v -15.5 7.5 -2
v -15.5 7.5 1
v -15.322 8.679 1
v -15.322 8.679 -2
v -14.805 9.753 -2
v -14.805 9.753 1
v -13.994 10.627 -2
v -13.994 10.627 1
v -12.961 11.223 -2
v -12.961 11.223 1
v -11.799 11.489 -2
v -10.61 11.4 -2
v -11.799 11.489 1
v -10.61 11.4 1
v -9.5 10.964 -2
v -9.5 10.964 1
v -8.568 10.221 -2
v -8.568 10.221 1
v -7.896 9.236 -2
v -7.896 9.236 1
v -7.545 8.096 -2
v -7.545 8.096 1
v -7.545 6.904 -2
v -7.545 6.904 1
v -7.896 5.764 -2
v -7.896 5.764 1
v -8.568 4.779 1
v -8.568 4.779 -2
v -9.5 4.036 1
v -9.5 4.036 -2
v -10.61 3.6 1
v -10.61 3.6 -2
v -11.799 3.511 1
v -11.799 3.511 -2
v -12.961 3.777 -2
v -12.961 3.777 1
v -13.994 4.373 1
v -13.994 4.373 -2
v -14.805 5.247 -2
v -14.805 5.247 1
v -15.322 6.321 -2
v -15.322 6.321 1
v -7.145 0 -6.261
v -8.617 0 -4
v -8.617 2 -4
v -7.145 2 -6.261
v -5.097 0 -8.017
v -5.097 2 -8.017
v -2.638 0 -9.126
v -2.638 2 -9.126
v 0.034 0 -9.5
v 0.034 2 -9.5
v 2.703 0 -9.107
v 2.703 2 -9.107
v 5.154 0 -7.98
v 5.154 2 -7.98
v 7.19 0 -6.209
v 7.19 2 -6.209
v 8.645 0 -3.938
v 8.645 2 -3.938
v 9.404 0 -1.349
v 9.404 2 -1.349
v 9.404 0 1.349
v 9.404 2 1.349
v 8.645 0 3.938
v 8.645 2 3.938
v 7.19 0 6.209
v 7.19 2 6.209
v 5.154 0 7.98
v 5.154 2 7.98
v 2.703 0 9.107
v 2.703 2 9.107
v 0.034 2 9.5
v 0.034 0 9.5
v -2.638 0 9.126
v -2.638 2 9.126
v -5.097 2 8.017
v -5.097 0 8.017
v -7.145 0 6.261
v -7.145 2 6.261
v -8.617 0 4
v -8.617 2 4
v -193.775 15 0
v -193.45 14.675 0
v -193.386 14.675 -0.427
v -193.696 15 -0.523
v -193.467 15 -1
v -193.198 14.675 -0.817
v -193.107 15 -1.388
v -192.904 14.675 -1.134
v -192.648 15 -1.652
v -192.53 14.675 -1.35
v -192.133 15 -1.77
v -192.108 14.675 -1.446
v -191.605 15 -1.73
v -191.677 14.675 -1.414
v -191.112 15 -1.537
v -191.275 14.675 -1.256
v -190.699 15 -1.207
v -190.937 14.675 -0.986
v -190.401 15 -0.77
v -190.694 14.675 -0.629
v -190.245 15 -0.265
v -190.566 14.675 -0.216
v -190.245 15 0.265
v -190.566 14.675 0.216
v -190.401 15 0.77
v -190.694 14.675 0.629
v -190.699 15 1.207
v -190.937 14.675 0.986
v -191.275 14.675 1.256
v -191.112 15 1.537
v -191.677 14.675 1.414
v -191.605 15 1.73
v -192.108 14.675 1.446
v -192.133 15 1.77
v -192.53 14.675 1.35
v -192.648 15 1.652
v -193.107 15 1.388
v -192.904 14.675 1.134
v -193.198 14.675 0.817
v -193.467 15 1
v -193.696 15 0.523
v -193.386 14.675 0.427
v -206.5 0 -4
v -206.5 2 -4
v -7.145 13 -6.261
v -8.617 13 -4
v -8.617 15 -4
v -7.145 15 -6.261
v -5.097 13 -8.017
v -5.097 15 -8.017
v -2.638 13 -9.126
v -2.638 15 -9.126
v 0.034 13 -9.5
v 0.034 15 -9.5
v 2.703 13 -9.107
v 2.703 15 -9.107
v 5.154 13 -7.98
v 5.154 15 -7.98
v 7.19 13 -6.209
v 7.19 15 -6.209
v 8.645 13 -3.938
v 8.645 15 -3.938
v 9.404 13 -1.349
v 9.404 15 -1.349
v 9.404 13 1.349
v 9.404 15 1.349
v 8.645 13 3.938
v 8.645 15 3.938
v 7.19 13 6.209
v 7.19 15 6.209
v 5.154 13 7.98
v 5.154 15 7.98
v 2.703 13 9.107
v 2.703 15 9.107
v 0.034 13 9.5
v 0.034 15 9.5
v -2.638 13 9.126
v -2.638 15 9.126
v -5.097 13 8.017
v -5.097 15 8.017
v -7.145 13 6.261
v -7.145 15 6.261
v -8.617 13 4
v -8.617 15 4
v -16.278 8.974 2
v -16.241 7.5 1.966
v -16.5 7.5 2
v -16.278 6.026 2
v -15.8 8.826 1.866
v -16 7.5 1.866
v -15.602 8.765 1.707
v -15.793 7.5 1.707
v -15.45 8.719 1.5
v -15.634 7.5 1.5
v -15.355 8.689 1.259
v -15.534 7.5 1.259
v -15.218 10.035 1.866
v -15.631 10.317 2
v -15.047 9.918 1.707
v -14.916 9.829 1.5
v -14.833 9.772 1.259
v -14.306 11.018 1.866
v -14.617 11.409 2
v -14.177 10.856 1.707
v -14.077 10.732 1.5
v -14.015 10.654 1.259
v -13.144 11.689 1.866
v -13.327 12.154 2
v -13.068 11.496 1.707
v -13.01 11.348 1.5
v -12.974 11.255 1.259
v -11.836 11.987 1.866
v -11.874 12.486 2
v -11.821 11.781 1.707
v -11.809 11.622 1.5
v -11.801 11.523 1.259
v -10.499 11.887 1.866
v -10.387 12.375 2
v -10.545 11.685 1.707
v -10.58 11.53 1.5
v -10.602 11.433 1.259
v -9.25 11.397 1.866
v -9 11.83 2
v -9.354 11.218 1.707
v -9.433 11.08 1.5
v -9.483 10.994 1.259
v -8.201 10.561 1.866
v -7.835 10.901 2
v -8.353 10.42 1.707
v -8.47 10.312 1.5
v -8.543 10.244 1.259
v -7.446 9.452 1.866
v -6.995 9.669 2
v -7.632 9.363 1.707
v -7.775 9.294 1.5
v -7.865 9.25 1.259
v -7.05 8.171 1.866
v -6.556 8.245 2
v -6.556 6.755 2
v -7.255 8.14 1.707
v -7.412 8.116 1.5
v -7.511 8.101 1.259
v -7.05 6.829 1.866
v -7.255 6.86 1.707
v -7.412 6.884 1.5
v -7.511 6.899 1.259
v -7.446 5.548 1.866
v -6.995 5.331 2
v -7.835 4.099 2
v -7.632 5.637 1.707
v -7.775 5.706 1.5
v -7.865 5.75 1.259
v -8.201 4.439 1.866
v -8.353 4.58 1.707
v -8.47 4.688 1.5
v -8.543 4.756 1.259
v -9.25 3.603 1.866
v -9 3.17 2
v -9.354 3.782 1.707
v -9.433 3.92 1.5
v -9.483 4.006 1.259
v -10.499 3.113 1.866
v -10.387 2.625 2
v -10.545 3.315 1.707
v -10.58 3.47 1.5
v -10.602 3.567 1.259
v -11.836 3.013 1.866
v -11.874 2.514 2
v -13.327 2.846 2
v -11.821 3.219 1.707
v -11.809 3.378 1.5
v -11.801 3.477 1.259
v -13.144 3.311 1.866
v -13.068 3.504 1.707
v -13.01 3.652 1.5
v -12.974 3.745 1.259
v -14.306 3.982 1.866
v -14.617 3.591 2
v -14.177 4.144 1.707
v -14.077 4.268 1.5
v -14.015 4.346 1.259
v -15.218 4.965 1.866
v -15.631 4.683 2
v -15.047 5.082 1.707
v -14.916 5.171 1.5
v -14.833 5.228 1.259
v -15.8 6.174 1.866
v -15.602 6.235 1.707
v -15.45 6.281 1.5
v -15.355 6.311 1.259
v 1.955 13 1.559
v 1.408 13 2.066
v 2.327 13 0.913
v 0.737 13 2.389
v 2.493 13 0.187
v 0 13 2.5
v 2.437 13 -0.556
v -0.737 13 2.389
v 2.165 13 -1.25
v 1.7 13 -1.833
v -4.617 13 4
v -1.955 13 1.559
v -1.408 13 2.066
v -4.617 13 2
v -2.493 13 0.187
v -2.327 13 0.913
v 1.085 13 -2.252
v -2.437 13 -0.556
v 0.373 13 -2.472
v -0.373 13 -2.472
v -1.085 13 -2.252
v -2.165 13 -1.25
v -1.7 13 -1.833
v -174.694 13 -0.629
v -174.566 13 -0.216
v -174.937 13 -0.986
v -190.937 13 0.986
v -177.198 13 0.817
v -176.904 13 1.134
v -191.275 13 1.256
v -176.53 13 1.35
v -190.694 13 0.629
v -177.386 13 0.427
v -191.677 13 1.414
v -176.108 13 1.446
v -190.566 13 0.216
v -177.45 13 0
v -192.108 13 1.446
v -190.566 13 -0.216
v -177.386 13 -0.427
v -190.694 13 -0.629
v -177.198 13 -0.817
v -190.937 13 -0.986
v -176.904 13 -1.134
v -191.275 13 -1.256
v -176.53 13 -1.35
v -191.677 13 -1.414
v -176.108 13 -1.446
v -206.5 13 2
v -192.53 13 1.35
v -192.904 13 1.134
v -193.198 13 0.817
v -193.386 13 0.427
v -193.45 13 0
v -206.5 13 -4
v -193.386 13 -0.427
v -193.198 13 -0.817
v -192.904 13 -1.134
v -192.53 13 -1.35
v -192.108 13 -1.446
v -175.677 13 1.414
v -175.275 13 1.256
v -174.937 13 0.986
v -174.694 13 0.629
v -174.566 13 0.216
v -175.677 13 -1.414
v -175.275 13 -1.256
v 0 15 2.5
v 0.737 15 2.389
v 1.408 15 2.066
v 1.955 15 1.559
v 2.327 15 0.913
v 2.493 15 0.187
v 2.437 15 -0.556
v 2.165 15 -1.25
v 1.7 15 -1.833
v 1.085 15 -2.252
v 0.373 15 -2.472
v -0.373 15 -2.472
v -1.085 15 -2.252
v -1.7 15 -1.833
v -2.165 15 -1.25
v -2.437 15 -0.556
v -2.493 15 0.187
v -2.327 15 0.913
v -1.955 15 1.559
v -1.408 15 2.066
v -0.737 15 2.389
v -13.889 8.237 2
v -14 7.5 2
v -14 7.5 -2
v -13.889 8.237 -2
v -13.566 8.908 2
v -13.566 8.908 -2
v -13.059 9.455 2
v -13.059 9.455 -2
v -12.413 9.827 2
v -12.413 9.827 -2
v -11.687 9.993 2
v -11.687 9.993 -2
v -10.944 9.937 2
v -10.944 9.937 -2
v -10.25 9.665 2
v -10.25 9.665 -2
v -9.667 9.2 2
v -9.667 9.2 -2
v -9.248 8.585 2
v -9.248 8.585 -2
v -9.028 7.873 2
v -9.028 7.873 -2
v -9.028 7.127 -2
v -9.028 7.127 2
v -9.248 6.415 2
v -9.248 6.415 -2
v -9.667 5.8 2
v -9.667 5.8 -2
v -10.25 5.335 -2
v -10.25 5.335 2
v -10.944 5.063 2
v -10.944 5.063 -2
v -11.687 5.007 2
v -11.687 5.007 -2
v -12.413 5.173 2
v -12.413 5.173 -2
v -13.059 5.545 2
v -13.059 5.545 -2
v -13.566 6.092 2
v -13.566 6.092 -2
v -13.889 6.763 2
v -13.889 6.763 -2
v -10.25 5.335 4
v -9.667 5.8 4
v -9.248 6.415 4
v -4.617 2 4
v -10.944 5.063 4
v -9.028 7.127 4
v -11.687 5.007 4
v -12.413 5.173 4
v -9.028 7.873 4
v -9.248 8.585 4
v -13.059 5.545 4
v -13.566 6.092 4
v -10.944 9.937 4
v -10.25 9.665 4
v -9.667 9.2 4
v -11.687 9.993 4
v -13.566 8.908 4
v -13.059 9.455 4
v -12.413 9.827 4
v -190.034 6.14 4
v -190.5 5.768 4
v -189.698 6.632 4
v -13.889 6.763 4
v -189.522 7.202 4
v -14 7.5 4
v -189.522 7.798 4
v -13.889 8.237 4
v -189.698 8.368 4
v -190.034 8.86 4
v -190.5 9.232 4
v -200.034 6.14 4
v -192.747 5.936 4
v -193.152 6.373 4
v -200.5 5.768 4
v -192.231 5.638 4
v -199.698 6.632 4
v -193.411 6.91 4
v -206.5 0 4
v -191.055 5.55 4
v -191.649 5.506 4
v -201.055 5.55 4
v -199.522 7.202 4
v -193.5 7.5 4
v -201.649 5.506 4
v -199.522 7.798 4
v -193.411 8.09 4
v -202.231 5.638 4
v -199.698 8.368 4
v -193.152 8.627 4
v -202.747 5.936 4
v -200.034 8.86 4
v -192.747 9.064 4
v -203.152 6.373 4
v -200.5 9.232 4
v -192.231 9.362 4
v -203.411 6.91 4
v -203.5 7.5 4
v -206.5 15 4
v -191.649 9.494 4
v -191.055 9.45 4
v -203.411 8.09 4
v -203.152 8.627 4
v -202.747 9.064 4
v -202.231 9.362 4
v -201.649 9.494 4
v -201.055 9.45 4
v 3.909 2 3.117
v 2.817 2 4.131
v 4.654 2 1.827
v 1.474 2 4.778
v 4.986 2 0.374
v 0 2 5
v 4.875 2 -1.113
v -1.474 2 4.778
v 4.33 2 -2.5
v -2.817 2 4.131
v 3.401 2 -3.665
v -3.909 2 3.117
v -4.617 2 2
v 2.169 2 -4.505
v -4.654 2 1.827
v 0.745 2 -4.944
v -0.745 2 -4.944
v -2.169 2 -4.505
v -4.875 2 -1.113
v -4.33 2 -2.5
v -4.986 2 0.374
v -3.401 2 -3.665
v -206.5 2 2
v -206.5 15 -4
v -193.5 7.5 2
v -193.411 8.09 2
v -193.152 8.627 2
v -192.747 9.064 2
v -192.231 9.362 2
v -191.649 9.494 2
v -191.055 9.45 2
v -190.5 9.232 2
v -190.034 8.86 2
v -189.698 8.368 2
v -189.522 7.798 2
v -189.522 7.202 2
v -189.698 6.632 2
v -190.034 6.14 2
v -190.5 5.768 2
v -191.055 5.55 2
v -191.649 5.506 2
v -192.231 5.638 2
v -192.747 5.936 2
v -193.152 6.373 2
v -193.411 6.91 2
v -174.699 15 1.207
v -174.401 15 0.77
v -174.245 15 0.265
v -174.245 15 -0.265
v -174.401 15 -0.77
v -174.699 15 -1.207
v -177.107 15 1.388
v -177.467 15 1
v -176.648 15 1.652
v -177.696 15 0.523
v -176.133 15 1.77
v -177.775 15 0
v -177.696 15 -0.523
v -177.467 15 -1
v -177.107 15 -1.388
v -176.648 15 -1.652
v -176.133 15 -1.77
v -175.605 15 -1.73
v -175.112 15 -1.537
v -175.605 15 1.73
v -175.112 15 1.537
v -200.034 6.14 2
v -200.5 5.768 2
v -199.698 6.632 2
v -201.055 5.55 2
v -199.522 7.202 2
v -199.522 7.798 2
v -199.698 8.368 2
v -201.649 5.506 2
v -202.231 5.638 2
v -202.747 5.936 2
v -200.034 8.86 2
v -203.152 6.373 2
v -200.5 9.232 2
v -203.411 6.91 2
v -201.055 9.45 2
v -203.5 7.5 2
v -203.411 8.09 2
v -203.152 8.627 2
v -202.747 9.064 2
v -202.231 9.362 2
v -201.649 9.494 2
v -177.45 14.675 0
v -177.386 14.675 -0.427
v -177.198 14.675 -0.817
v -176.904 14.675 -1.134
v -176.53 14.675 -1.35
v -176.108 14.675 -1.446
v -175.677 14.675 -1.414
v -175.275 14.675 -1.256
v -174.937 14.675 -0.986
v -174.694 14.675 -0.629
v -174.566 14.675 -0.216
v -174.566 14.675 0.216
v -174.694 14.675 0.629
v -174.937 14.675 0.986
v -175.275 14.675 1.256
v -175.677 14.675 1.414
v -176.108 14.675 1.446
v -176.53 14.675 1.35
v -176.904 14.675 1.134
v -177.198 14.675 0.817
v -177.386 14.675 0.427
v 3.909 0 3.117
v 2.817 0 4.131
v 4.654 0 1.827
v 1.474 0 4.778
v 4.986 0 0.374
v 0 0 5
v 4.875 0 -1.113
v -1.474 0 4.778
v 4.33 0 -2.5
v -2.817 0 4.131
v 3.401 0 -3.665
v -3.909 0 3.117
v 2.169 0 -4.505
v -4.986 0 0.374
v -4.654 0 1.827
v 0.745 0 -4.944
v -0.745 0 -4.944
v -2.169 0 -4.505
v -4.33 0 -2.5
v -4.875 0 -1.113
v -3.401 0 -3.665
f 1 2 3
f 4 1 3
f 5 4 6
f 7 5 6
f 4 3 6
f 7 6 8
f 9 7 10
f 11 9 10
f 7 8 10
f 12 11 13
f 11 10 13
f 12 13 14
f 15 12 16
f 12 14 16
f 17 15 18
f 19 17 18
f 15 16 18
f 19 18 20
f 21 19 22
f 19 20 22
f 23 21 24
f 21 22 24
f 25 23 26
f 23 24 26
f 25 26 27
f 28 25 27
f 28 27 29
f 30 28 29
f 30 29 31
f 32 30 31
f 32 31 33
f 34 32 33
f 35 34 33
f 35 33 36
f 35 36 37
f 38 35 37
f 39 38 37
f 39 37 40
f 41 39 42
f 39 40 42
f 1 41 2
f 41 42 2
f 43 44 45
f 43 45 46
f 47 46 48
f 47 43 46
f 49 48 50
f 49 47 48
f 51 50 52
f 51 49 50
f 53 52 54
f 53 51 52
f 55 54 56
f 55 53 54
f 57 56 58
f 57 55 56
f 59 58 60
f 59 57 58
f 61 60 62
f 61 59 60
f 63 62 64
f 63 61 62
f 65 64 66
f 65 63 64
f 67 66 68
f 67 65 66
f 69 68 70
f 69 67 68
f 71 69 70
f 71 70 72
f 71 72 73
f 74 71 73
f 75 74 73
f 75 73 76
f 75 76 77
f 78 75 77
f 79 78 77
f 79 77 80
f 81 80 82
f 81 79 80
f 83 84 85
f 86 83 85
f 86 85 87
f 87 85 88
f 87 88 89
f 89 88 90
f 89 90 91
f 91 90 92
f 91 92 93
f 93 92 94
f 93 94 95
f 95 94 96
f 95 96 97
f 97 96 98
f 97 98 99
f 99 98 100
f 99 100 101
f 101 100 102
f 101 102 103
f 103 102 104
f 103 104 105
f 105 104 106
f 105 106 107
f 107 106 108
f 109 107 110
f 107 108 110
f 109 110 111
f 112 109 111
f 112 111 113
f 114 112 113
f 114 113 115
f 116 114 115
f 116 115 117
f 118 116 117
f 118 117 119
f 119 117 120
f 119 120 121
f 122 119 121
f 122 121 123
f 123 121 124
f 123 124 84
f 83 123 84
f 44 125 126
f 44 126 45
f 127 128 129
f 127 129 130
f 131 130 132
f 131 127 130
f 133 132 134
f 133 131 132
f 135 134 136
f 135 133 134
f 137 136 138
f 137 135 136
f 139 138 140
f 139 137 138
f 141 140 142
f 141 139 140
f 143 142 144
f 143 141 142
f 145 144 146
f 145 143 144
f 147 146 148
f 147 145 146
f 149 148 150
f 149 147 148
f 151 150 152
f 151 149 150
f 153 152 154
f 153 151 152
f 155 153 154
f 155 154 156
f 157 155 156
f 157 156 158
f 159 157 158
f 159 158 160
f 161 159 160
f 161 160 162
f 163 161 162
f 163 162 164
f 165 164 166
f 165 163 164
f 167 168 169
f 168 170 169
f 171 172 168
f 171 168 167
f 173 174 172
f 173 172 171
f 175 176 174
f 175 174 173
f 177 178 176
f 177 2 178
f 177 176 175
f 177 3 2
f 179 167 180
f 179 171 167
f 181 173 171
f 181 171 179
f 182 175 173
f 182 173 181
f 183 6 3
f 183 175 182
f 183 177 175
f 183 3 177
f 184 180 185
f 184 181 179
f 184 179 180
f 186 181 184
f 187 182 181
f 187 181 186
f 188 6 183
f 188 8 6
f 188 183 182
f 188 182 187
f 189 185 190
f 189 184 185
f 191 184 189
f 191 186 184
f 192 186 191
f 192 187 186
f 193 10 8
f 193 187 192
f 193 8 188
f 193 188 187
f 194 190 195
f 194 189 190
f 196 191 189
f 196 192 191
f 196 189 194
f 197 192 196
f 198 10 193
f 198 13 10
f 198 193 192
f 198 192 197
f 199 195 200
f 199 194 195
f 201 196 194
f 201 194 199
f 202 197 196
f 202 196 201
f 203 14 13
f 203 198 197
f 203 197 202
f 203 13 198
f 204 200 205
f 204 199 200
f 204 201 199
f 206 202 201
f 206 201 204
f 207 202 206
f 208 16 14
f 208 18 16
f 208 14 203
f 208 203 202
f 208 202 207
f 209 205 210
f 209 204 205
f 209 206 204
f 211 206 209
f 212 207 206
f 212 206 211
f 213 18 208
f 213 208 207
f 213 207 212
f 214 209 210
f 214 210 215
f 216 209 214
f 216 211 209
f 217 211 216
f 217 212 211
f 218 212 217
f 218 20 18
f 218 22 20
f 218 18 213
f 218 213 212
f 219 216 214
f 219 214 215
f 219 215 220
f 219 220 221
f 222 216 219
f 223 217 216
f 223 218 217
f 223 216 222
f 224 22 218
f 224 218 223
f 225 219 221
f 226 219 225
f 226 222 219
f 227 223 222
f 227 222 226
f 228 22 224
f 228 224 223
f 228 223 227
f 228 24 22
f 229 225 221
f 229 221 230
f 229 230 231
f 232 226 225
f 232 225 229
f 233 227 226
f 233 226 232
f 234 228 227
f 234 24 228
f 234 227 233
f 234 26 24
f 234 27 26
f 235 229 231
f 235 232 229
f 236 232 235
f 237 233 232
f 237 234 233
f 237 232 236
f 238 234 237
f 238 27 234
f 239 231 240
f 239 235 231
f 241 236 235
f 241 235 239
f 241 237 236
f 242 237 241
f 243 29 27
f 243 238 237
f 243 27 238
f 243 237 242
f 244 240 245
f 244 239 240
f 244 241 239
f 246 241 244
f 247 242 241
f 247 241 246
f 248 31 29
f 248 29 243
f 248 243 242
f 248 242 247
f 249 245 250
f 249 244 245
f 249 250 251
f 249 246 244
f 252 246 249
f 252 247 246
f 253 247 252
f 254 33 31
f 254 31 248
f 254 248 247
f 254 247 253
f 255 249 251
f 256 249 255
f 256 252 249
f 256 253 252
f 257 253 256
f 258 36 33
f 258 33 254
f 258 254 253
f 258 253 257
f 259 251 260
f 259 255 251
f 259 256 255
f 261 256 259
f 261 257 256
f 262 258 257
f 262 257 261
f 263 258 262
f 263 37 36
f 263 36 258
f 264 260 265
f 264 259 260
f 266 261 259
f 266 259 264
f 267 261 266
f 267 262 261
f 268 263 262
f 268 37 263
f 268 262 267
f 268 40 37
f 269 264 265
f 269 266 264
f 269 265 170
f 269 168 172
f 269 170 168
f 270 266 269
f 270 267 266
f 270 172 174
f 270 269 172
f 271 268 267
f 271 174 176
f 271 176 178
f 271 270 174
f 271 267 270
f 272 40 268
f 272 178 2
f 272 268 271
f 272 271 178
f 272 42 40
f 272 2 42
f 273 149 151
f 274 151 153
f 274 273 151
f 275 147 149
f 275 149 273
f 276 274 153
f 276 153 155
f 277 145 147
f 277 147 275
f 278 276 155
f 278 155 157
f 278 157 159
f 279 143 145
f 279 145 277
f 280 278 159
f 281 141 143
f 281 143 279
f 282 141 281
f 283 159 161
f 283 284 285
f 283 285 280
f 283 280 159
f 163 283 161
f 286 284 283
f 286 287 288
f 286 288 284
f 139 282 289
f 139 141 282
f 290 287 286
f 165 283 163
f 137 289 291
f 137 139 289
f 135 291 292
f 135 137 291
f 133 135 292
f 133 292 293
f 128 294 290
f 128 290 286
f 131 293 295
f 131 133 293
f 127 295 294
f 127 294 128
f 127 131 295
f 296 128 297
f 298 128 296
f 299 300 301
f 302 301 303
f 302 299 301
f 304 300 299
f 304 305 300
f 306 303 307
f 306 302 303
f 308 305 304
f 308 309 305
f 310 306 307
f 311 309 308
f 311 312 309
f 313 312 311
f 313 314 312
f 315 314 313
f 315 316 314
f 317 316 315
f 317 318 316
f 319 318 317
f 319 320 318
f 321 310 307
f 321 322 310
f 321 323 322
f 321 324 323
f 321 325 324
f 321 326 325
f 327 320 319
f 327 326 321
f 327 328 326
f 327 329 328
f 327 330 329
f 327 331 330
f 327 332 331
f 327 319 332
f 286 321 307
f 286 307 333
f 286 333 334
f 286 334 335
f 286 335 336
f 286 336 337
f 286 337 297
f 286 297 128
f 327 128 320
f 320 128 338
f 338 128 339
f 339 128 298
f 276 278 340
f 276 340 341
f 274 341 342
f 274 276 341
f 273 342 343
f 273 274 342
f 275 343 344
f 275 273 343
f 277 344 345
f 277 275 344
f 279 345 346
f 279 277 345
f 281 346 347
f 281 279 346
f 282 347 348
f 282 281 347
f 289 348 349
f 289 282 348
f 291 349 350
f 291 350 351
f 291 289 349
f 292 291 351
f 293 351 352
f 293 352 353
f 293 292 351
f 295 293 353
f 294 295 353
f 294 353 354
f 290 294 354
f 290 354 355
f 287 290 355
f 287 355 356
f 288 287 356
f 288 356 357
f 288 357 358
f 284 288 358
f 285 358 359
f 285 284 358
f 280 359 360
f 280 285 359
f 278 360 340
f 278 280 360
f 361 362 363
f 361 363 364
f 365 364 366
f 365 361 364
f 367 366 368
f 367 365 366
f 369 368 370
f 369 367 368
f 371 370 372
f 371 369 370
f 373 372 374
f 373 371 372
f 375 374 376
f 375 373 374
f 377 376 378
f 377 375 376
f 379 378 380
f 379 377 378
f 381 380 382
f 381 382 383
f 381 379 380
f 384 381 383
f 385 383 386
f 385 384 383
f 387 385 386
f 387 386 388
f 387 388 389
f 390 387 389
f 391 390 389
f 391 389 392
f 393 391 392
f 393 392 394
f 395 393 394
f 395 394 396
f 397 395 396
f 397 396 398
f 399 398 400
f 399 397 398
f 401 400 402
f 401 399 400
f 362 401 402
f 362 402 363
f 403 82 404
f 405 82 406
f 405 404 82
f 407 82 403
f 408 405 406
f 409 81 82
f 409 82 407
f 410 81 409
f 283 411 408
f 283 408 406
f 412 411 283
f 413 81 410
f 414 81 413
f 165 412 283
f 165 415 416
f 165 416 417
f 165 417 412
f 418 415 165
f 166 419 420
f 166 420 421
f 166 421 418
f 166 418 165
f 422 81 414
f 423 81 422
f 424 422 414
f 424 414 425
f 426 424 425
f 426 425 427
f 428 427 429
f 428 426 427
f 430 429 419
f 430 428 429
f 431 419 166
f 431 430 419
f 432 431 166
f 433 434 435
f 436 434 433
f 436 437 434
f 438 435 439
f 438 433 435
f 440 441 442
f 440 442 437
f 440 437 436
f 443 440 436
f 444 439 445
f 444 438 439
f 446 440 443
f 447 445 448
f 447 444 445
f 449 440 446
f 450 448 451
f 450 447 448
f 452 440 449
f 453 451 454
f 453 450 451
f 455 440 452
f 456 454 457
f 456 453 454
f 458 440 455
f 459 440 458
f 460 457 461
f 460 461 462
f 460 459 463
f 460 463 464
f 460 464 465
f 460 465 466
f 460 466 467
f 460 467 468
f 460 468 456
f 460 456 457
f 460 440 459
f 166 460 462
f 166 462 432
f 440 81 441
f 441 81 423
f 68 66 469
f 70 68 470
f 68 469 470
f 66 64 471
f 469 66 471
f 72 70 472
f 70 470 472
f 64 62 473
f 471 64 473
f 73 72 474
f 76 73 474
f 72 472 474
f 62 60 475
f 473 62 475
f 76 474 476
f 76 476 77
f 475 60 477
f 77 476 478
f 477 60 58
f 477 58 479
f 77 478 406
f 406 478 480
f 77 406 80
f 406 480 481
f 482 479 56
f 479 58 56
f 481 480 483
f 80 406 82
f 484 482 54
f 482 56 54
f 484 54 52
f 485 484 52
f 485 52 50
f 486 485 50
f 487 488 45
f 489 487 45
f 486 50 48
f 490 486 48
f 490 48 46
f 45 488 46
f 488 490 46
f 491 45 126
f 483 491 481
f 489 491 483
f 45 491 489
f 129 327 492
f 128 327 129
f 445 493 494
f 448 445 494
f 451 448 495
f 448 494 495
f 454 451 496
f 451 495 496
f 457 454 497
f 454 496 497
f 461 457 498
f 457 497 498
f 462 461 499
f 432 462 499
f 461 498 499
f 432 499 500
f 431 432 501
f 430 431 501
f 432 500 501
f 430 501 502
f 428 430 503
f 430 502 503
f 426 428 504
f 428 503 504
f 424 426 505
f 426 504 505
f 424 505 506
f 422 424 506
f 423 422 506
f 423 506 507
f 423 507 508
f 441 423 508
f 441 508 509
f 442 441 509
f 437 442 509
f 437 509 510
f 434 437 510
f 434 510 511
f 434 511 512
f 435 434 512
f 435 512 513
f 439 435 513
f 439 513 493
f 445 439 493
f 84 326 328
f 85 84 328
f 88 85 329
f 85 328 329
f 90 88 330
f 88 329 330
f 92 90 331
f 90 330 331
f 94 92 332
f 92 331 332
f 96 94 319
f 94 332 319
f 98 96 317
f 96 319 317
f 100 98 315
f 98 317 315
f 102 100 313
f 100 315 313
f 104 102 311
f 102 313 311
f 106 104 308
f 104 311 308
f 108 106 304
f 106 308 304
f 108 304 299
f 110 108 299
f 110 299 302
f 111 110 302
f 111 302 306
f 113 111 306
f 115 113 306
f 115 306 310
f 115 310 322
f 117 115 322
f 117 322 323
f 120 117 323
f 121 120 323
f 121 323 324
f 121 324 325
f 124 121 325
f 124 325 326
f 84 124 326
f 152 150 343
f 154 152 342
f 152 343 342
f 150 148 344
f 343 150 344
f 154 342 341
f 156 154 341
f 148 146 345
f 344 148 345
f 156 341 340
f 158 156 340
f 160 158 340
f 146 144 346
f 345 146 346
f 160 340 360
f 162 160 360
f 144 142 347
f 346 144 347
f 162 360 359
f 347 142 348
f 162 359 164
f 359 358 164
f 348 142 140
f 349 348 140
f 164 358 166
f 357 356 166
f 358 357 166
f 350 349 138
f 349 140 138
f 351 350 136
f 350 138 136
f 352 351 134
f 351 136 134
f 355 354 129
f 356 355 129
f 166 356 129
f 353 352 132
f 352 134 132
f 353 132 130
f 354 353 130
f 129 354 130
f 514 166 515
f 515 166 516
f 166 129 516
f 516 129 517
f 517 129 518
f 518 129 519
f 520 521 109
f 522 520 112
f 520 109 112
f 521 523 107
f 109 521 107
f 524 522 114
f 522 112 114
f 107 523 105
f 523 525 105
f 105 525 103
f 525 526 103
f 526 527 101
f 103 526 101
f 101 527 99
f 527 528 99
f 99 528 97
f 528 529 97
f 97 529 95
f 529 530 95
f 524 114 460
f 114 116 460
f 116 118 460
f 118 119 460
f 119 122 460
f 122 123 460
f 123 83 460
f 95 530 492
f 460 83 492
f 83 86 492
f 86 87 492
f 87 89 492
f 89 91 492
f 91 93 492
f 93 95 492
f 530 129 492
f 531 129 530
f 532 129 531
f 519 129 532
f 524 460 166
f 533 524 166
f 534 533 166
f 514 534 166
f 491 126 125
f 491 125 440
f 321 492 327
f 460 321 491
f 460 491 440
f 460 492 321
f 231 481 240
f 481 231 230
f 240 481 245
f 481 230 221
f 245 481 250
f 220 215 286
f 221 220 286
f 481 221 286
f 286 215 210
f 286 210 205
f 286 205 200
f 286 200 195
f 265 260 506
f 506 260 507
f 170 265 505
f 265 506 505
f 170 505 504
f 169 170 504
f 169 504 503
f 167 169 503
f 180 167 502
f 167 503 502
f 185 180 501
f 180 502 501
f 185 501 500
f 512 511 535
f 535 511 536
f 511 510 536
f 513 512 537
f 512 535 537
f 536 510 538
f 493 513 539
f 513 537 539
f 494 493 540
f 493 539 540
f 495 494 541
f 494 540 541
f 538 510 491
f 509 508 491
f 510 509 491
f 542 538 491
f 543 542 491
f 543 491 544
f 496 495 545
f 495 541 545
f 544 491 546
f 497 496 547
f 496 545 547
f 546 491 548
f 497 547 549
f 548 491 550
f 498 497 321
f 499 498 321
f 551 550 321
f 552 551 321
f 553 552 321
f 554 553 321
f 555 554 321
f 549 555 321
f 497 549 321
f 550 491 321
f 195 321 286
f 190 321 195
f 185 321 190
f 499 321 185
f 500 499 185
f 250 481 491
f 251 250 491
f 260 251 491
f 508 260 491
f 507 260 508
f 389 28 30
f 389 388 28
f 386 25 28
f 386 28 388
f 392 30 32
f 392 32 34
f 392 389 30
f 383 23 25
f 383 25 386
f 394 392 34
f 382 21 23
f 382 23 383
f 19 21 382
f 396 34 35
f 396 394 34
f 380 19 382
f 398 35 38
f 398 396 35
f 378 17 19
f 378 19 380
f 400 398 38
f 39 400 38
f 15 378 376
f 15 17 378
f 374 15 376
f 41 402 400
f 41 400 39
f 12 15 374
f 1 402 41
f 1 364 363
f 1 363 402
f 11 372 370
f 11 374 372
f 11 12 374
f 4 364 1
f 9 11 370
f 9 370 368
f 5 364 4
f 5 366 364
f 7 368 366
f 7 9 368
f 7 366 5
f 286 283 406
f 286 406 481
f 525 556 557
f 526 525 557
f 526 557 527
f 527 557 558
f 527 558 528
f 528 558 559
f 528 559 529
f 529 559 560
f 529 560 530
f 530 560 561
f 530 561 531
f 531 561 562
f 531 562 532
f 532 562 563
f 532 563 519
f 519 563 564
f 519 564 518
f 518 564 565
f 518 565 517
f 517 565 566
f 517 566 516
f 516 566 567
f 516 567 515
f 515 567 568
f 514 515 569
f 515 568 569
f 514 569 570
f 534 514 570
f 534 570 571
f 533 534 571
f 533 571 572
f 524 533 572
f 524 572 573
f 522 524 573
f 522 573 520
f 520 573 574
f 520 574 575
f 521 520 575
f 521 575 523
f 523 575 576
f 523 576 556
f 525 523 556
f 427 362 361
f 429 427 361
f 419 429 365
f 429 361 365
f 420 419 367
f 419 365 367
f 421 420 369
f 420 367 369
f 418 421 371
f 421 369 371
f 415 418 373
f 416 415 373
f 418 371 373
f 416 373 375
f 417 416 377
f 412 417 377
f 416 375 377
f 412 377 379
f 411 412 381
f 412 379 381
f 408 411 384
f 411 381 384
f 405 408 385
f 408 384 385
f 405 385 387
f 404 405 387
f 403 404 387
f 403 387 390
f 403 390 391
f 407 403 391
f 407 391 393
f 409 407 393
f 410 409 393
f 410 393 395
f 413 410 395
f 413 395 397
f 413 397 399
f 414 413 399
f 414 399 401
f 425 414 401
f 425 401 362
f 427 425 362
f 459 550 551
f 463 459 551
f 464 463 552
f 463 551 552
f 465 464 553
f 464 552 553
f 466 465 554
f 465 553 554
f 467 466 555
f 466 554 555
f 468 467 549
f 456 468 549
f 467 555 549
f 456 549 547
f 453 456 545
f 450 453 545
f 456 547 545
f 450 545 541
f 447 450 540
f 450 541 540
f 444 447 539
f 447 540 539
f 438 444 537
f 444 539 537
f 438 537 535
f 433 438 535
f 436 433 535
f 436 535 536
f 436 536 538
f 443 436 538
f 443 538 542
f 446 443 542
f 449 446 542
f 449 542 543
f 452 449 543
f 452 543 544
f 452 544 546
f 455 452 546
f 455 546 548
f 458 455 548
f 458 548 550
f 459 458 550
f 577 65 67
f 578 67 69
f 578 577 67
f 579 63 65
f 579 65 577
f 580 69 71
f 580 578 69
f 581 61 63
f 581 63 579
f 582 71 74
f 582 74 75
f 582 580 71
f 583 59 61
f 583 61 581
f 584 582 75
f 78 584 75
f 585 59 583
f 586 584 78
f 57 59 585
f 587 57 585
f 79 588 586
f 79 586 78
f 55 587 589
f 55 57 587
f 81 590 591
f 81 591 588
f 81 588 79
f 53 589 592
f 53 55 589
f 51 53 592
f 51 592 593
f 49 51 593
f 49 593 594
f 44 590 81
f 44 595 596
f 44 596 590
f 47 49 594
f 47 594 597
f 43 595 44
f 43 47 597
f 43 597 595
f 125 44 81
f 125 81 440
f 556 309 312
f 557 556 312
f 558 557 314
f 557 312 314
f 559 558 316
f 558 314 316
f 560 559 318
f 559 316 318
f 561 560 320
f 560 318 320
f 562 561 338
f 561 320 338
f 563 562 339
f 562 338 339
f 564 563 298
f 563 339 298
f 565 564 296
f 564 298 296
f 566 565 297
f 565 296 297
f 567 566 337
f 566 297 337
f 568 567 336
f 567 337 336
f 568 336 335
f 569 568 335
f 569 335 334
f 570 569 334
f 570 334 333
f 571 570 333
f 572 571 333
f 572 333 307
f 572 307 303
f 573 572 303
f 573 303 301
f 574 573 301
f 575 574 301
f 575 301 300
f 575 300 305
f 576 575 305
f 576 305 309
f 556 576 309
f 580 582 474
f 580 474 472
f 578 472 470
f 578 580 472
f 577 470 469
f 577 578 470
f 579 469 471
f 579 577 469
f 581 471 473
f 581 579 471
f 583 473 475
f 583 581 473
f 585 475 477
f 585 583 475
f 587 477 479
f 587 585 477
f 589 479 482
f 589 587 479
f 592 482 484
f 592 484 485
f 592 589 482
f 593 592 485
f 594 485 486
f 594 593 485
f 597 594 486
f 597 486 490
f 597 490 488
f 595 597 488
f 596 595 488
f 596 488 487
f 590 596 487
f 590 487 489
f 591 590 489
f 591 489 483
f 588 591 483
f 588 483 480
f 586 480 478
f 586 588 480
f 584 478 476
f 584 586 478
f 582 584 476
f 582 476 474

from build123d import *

# Parameters (mm, degrees)
SKETCH1_R                         = 5
BOSS_EXTRUDE3_DEPTH               = 2
SKETCH5_W                         = 2
SKETCH5_H                         = 11
BOSS_EXTRUDE4_DEPTH               = 197.88316
SKETCH6_R                         = 2.5
BOSS_EXTRUDE5_DEPTH               = 2
SKETCH8_W                         = 2
SKETCH8_H                         = 11
BOSS_EXTRUDE6_DEPTH               = 4
CUT_EXTRUDE8_REACH                = 209.363
SKETCH10_R                        = 2
SKETCH11_R                        = 4
SKETCH11_R_2                      = 2.5
BOSS_EXTRUDE7_DEPTH               = 4
CUT_EXTRUDE9_REACH                = 209.363
SKETCH12_R                        = 2.5
FILLET1_R                         = 1
M3_5X0_6_TAPPED_HOLE7_D           = 2.9
M3_5X0_6_TAPPED_HOLE7_DEPTH       = 2
M3_5X0_6_TAPPED_HOLE7_CSINK_D     = 3.55
M3_5X0_6_TAPPED_HOLE7_CSINK_ANGLE = 90


with BuildPart() as part:
    # Sketch1 → Boss-Extrude3 (new body)
    with BuildSketch(Plane(origin=(0, 0, 0), x_dir=(1, 0, 0), z_dir=(0, 1, 0))):
        with BuildLine():
            Line((-206.5, 4), (-8.61684397, 4))
            ThreePointArc((-8.61684397, 4), (9.5, 0), (-8.61684397, -4))
            Line((-8.61684397, -4), (-206.5, -4))
            Line((-206.5, -4), (-206.5, 4))
        make_face()
        with Locations(Location((0, 0, 0), (0, 0, 270))):
            Circle(SKETCH1_R, mode=Mode.SUBTRACT)
    extrude(amount=BOSS_EXTRUDE3_DEPTH)

    # Sketch5 → Boss-Extrude4 (add)
    with BuildSketch(Plane.ZY.offset(206.5)):
        with Locations((3, 7.5)):
            Rectangle(SKETCH5_W, SKETCH5_H)
    extrude(amount=-BOSS_EXTRUDE4_DEPTH)


with BuildPart() as boss_extrude5_tool:
    # Sketch6 → Boss-Extrude5 (new body)
    with BuildSketch(Plane(origin=(0, 13, 0), x_dir=(1, 0, 0), z_dir=(0, 1, 0))):
        with BuildLine():
            Line((-206.5, 4), (-8.61684397, 4))
            ThreePointArc((-8.61684397, 4), (9.5, 0), (-8.61684397, -4))
            Line((-8.61684397, -4), (-206.5, -4))
            Line((-206.5, -4), (-206.5, 4))
        make_face()
        with Locations(Location((0, 0, 0), (0, 0, 270))):
            Circle(SKETCH6_R, mode=Mode.SUBTRACT)
    extrude(amount=BOSS_EXTRUDE5_DEPTH)


with BuildPart() as part_1:
    add(part.part)


with BuildPart() as part_2:
    # Boss-Extrude5: joined with boss_extrude5_tool
    add(part_1.part.fuse(boss_extrude5_tool.part, tol=0.00001))

    # Sketch8 → Boss-Extrude6 (add)
    with BuildSketch(Plane(origin=(-8.61684397, 0, 0), x_dir=(0, 0, -1), z_dir=(1, 0, 0))):
        with Locations((-3, 7.5)):
            Rectangle(SKETCH8_W, SKETCH8_H)
    extrude(amount=BOSS_EXTRUDE6_DEPTH)

    # Sketch10 → Cut-Extrude8 (cut, up to next)
    with BuildSketch(Plane(origin=(0, 0, 2), x_dir=(-1, 0, 0), z_dir=(0, 0, -1)), mode=Mode.PRIVATE) as cut_extrude8_sk1:
        with Locations((201.5, 7.5)):
            Circle(SKETCH10_R)
    cut_extrude8_tool1 = extrude(cut_extrude8_sk1.sketch, amount=-CUT_EXTRUDE8_REACH, mode=Mode.PRIVATE) & part_2.part
    # Sketch10 → Cut-Extrude8 (cut, up to next)
    with BuildSketch(Plane(origin=(0, 0, 2), x_dir=(-1, 0, 0), z_dir=(0, 0, -1)), mode=Mode.PRIVATE) as cut_extrude8_sk2:
        with Locations((191.5, 7.5)):
            Circle(SKETCH10_R)
    cut_extrude8_tool2 = extrude(cut_extrude8_sk2.sketch, amount=-CUT_EXTRUDE8_REACH, mode=Mode.PRIVATE) & part_2.part
    add(cut_extrude8_tool1.solids().sort_by_distance((-201.5, 7.5, 2))[0], mode=Mode.SUBTRACT)
    add(cut_extrude8_tool2.solids().sort_by_distance((-191.5, 7.5, 2))[0], mode=Mode.SUBTRACT)

    # Sketch11 → Boss-Extrude7 (add)
    with BuildSketch(Plane(origin=(0, 0, 2), x_dir=(-1, 0, 0), z_dir=(0, 0, -1))):
        with Locations((11.5, 7.5)):
            Circle(SKETCH11_R)
        with Locations((11.5, 7.5)):
            Circle(SKETCH11_R_2, mode=Mode.SUBTRACT)
    extrude(amount=BOSS_EXTRUDE7_DEPTH)

    # Sketch12 → Cut-Extrude9 (cut, up to next)
    with BuildSketch(Plane(origin=(0, 0, 2), x_dir=(-1, 0, 0), z_dir=(0, 0, -1)), mode=Mode.PRIVATE) as cut_extrude9_sk1:
        with Locations((11.5, 7.5)):
            Circle(SKETCH12_R)
    cut_extrude9_tool1 = extrude(cut_extrude9_sk1.sketch, amount=-CUT_EXTRUDE9_REACH, mode=Mode.PRIVATE) & part_2.part
    add(cut_extrude9_tool1.solids().sort_by_distance((-11.5, 7.5, 2))[0], mode=Mode.SUBTRACT)

    # Fillet1
    fillet1_edges = [part_2.edges().sort_by_distance(p)[0] for p in [
        (-7.5, 7.5, 2),
    ]]
    fillet(fillet1_edges, radius=FILLET1_R)

    # M3.5x0.6 Tapped Hole7
    with Locations(Plane(origin=(0, 15, 0), x_dir=(1, 0, 0), z_dir=(0, 1, 0))):
        with Locations((-176, 0), (-192, 0)):
            CounterSinkHole(M3_5X0_6_TAPPED_HOLE7_D / 2, M3_5X0_6_TAPPED_HOLE7_CSINK_D / 2, depth=M3_5X0_6_TAPPED_HOLE7_DEPTH, counter_sink_angle=M3_5X0_6_TAPPED_HOLE7_CSINK_ANGLE)


solid = part_2.part
